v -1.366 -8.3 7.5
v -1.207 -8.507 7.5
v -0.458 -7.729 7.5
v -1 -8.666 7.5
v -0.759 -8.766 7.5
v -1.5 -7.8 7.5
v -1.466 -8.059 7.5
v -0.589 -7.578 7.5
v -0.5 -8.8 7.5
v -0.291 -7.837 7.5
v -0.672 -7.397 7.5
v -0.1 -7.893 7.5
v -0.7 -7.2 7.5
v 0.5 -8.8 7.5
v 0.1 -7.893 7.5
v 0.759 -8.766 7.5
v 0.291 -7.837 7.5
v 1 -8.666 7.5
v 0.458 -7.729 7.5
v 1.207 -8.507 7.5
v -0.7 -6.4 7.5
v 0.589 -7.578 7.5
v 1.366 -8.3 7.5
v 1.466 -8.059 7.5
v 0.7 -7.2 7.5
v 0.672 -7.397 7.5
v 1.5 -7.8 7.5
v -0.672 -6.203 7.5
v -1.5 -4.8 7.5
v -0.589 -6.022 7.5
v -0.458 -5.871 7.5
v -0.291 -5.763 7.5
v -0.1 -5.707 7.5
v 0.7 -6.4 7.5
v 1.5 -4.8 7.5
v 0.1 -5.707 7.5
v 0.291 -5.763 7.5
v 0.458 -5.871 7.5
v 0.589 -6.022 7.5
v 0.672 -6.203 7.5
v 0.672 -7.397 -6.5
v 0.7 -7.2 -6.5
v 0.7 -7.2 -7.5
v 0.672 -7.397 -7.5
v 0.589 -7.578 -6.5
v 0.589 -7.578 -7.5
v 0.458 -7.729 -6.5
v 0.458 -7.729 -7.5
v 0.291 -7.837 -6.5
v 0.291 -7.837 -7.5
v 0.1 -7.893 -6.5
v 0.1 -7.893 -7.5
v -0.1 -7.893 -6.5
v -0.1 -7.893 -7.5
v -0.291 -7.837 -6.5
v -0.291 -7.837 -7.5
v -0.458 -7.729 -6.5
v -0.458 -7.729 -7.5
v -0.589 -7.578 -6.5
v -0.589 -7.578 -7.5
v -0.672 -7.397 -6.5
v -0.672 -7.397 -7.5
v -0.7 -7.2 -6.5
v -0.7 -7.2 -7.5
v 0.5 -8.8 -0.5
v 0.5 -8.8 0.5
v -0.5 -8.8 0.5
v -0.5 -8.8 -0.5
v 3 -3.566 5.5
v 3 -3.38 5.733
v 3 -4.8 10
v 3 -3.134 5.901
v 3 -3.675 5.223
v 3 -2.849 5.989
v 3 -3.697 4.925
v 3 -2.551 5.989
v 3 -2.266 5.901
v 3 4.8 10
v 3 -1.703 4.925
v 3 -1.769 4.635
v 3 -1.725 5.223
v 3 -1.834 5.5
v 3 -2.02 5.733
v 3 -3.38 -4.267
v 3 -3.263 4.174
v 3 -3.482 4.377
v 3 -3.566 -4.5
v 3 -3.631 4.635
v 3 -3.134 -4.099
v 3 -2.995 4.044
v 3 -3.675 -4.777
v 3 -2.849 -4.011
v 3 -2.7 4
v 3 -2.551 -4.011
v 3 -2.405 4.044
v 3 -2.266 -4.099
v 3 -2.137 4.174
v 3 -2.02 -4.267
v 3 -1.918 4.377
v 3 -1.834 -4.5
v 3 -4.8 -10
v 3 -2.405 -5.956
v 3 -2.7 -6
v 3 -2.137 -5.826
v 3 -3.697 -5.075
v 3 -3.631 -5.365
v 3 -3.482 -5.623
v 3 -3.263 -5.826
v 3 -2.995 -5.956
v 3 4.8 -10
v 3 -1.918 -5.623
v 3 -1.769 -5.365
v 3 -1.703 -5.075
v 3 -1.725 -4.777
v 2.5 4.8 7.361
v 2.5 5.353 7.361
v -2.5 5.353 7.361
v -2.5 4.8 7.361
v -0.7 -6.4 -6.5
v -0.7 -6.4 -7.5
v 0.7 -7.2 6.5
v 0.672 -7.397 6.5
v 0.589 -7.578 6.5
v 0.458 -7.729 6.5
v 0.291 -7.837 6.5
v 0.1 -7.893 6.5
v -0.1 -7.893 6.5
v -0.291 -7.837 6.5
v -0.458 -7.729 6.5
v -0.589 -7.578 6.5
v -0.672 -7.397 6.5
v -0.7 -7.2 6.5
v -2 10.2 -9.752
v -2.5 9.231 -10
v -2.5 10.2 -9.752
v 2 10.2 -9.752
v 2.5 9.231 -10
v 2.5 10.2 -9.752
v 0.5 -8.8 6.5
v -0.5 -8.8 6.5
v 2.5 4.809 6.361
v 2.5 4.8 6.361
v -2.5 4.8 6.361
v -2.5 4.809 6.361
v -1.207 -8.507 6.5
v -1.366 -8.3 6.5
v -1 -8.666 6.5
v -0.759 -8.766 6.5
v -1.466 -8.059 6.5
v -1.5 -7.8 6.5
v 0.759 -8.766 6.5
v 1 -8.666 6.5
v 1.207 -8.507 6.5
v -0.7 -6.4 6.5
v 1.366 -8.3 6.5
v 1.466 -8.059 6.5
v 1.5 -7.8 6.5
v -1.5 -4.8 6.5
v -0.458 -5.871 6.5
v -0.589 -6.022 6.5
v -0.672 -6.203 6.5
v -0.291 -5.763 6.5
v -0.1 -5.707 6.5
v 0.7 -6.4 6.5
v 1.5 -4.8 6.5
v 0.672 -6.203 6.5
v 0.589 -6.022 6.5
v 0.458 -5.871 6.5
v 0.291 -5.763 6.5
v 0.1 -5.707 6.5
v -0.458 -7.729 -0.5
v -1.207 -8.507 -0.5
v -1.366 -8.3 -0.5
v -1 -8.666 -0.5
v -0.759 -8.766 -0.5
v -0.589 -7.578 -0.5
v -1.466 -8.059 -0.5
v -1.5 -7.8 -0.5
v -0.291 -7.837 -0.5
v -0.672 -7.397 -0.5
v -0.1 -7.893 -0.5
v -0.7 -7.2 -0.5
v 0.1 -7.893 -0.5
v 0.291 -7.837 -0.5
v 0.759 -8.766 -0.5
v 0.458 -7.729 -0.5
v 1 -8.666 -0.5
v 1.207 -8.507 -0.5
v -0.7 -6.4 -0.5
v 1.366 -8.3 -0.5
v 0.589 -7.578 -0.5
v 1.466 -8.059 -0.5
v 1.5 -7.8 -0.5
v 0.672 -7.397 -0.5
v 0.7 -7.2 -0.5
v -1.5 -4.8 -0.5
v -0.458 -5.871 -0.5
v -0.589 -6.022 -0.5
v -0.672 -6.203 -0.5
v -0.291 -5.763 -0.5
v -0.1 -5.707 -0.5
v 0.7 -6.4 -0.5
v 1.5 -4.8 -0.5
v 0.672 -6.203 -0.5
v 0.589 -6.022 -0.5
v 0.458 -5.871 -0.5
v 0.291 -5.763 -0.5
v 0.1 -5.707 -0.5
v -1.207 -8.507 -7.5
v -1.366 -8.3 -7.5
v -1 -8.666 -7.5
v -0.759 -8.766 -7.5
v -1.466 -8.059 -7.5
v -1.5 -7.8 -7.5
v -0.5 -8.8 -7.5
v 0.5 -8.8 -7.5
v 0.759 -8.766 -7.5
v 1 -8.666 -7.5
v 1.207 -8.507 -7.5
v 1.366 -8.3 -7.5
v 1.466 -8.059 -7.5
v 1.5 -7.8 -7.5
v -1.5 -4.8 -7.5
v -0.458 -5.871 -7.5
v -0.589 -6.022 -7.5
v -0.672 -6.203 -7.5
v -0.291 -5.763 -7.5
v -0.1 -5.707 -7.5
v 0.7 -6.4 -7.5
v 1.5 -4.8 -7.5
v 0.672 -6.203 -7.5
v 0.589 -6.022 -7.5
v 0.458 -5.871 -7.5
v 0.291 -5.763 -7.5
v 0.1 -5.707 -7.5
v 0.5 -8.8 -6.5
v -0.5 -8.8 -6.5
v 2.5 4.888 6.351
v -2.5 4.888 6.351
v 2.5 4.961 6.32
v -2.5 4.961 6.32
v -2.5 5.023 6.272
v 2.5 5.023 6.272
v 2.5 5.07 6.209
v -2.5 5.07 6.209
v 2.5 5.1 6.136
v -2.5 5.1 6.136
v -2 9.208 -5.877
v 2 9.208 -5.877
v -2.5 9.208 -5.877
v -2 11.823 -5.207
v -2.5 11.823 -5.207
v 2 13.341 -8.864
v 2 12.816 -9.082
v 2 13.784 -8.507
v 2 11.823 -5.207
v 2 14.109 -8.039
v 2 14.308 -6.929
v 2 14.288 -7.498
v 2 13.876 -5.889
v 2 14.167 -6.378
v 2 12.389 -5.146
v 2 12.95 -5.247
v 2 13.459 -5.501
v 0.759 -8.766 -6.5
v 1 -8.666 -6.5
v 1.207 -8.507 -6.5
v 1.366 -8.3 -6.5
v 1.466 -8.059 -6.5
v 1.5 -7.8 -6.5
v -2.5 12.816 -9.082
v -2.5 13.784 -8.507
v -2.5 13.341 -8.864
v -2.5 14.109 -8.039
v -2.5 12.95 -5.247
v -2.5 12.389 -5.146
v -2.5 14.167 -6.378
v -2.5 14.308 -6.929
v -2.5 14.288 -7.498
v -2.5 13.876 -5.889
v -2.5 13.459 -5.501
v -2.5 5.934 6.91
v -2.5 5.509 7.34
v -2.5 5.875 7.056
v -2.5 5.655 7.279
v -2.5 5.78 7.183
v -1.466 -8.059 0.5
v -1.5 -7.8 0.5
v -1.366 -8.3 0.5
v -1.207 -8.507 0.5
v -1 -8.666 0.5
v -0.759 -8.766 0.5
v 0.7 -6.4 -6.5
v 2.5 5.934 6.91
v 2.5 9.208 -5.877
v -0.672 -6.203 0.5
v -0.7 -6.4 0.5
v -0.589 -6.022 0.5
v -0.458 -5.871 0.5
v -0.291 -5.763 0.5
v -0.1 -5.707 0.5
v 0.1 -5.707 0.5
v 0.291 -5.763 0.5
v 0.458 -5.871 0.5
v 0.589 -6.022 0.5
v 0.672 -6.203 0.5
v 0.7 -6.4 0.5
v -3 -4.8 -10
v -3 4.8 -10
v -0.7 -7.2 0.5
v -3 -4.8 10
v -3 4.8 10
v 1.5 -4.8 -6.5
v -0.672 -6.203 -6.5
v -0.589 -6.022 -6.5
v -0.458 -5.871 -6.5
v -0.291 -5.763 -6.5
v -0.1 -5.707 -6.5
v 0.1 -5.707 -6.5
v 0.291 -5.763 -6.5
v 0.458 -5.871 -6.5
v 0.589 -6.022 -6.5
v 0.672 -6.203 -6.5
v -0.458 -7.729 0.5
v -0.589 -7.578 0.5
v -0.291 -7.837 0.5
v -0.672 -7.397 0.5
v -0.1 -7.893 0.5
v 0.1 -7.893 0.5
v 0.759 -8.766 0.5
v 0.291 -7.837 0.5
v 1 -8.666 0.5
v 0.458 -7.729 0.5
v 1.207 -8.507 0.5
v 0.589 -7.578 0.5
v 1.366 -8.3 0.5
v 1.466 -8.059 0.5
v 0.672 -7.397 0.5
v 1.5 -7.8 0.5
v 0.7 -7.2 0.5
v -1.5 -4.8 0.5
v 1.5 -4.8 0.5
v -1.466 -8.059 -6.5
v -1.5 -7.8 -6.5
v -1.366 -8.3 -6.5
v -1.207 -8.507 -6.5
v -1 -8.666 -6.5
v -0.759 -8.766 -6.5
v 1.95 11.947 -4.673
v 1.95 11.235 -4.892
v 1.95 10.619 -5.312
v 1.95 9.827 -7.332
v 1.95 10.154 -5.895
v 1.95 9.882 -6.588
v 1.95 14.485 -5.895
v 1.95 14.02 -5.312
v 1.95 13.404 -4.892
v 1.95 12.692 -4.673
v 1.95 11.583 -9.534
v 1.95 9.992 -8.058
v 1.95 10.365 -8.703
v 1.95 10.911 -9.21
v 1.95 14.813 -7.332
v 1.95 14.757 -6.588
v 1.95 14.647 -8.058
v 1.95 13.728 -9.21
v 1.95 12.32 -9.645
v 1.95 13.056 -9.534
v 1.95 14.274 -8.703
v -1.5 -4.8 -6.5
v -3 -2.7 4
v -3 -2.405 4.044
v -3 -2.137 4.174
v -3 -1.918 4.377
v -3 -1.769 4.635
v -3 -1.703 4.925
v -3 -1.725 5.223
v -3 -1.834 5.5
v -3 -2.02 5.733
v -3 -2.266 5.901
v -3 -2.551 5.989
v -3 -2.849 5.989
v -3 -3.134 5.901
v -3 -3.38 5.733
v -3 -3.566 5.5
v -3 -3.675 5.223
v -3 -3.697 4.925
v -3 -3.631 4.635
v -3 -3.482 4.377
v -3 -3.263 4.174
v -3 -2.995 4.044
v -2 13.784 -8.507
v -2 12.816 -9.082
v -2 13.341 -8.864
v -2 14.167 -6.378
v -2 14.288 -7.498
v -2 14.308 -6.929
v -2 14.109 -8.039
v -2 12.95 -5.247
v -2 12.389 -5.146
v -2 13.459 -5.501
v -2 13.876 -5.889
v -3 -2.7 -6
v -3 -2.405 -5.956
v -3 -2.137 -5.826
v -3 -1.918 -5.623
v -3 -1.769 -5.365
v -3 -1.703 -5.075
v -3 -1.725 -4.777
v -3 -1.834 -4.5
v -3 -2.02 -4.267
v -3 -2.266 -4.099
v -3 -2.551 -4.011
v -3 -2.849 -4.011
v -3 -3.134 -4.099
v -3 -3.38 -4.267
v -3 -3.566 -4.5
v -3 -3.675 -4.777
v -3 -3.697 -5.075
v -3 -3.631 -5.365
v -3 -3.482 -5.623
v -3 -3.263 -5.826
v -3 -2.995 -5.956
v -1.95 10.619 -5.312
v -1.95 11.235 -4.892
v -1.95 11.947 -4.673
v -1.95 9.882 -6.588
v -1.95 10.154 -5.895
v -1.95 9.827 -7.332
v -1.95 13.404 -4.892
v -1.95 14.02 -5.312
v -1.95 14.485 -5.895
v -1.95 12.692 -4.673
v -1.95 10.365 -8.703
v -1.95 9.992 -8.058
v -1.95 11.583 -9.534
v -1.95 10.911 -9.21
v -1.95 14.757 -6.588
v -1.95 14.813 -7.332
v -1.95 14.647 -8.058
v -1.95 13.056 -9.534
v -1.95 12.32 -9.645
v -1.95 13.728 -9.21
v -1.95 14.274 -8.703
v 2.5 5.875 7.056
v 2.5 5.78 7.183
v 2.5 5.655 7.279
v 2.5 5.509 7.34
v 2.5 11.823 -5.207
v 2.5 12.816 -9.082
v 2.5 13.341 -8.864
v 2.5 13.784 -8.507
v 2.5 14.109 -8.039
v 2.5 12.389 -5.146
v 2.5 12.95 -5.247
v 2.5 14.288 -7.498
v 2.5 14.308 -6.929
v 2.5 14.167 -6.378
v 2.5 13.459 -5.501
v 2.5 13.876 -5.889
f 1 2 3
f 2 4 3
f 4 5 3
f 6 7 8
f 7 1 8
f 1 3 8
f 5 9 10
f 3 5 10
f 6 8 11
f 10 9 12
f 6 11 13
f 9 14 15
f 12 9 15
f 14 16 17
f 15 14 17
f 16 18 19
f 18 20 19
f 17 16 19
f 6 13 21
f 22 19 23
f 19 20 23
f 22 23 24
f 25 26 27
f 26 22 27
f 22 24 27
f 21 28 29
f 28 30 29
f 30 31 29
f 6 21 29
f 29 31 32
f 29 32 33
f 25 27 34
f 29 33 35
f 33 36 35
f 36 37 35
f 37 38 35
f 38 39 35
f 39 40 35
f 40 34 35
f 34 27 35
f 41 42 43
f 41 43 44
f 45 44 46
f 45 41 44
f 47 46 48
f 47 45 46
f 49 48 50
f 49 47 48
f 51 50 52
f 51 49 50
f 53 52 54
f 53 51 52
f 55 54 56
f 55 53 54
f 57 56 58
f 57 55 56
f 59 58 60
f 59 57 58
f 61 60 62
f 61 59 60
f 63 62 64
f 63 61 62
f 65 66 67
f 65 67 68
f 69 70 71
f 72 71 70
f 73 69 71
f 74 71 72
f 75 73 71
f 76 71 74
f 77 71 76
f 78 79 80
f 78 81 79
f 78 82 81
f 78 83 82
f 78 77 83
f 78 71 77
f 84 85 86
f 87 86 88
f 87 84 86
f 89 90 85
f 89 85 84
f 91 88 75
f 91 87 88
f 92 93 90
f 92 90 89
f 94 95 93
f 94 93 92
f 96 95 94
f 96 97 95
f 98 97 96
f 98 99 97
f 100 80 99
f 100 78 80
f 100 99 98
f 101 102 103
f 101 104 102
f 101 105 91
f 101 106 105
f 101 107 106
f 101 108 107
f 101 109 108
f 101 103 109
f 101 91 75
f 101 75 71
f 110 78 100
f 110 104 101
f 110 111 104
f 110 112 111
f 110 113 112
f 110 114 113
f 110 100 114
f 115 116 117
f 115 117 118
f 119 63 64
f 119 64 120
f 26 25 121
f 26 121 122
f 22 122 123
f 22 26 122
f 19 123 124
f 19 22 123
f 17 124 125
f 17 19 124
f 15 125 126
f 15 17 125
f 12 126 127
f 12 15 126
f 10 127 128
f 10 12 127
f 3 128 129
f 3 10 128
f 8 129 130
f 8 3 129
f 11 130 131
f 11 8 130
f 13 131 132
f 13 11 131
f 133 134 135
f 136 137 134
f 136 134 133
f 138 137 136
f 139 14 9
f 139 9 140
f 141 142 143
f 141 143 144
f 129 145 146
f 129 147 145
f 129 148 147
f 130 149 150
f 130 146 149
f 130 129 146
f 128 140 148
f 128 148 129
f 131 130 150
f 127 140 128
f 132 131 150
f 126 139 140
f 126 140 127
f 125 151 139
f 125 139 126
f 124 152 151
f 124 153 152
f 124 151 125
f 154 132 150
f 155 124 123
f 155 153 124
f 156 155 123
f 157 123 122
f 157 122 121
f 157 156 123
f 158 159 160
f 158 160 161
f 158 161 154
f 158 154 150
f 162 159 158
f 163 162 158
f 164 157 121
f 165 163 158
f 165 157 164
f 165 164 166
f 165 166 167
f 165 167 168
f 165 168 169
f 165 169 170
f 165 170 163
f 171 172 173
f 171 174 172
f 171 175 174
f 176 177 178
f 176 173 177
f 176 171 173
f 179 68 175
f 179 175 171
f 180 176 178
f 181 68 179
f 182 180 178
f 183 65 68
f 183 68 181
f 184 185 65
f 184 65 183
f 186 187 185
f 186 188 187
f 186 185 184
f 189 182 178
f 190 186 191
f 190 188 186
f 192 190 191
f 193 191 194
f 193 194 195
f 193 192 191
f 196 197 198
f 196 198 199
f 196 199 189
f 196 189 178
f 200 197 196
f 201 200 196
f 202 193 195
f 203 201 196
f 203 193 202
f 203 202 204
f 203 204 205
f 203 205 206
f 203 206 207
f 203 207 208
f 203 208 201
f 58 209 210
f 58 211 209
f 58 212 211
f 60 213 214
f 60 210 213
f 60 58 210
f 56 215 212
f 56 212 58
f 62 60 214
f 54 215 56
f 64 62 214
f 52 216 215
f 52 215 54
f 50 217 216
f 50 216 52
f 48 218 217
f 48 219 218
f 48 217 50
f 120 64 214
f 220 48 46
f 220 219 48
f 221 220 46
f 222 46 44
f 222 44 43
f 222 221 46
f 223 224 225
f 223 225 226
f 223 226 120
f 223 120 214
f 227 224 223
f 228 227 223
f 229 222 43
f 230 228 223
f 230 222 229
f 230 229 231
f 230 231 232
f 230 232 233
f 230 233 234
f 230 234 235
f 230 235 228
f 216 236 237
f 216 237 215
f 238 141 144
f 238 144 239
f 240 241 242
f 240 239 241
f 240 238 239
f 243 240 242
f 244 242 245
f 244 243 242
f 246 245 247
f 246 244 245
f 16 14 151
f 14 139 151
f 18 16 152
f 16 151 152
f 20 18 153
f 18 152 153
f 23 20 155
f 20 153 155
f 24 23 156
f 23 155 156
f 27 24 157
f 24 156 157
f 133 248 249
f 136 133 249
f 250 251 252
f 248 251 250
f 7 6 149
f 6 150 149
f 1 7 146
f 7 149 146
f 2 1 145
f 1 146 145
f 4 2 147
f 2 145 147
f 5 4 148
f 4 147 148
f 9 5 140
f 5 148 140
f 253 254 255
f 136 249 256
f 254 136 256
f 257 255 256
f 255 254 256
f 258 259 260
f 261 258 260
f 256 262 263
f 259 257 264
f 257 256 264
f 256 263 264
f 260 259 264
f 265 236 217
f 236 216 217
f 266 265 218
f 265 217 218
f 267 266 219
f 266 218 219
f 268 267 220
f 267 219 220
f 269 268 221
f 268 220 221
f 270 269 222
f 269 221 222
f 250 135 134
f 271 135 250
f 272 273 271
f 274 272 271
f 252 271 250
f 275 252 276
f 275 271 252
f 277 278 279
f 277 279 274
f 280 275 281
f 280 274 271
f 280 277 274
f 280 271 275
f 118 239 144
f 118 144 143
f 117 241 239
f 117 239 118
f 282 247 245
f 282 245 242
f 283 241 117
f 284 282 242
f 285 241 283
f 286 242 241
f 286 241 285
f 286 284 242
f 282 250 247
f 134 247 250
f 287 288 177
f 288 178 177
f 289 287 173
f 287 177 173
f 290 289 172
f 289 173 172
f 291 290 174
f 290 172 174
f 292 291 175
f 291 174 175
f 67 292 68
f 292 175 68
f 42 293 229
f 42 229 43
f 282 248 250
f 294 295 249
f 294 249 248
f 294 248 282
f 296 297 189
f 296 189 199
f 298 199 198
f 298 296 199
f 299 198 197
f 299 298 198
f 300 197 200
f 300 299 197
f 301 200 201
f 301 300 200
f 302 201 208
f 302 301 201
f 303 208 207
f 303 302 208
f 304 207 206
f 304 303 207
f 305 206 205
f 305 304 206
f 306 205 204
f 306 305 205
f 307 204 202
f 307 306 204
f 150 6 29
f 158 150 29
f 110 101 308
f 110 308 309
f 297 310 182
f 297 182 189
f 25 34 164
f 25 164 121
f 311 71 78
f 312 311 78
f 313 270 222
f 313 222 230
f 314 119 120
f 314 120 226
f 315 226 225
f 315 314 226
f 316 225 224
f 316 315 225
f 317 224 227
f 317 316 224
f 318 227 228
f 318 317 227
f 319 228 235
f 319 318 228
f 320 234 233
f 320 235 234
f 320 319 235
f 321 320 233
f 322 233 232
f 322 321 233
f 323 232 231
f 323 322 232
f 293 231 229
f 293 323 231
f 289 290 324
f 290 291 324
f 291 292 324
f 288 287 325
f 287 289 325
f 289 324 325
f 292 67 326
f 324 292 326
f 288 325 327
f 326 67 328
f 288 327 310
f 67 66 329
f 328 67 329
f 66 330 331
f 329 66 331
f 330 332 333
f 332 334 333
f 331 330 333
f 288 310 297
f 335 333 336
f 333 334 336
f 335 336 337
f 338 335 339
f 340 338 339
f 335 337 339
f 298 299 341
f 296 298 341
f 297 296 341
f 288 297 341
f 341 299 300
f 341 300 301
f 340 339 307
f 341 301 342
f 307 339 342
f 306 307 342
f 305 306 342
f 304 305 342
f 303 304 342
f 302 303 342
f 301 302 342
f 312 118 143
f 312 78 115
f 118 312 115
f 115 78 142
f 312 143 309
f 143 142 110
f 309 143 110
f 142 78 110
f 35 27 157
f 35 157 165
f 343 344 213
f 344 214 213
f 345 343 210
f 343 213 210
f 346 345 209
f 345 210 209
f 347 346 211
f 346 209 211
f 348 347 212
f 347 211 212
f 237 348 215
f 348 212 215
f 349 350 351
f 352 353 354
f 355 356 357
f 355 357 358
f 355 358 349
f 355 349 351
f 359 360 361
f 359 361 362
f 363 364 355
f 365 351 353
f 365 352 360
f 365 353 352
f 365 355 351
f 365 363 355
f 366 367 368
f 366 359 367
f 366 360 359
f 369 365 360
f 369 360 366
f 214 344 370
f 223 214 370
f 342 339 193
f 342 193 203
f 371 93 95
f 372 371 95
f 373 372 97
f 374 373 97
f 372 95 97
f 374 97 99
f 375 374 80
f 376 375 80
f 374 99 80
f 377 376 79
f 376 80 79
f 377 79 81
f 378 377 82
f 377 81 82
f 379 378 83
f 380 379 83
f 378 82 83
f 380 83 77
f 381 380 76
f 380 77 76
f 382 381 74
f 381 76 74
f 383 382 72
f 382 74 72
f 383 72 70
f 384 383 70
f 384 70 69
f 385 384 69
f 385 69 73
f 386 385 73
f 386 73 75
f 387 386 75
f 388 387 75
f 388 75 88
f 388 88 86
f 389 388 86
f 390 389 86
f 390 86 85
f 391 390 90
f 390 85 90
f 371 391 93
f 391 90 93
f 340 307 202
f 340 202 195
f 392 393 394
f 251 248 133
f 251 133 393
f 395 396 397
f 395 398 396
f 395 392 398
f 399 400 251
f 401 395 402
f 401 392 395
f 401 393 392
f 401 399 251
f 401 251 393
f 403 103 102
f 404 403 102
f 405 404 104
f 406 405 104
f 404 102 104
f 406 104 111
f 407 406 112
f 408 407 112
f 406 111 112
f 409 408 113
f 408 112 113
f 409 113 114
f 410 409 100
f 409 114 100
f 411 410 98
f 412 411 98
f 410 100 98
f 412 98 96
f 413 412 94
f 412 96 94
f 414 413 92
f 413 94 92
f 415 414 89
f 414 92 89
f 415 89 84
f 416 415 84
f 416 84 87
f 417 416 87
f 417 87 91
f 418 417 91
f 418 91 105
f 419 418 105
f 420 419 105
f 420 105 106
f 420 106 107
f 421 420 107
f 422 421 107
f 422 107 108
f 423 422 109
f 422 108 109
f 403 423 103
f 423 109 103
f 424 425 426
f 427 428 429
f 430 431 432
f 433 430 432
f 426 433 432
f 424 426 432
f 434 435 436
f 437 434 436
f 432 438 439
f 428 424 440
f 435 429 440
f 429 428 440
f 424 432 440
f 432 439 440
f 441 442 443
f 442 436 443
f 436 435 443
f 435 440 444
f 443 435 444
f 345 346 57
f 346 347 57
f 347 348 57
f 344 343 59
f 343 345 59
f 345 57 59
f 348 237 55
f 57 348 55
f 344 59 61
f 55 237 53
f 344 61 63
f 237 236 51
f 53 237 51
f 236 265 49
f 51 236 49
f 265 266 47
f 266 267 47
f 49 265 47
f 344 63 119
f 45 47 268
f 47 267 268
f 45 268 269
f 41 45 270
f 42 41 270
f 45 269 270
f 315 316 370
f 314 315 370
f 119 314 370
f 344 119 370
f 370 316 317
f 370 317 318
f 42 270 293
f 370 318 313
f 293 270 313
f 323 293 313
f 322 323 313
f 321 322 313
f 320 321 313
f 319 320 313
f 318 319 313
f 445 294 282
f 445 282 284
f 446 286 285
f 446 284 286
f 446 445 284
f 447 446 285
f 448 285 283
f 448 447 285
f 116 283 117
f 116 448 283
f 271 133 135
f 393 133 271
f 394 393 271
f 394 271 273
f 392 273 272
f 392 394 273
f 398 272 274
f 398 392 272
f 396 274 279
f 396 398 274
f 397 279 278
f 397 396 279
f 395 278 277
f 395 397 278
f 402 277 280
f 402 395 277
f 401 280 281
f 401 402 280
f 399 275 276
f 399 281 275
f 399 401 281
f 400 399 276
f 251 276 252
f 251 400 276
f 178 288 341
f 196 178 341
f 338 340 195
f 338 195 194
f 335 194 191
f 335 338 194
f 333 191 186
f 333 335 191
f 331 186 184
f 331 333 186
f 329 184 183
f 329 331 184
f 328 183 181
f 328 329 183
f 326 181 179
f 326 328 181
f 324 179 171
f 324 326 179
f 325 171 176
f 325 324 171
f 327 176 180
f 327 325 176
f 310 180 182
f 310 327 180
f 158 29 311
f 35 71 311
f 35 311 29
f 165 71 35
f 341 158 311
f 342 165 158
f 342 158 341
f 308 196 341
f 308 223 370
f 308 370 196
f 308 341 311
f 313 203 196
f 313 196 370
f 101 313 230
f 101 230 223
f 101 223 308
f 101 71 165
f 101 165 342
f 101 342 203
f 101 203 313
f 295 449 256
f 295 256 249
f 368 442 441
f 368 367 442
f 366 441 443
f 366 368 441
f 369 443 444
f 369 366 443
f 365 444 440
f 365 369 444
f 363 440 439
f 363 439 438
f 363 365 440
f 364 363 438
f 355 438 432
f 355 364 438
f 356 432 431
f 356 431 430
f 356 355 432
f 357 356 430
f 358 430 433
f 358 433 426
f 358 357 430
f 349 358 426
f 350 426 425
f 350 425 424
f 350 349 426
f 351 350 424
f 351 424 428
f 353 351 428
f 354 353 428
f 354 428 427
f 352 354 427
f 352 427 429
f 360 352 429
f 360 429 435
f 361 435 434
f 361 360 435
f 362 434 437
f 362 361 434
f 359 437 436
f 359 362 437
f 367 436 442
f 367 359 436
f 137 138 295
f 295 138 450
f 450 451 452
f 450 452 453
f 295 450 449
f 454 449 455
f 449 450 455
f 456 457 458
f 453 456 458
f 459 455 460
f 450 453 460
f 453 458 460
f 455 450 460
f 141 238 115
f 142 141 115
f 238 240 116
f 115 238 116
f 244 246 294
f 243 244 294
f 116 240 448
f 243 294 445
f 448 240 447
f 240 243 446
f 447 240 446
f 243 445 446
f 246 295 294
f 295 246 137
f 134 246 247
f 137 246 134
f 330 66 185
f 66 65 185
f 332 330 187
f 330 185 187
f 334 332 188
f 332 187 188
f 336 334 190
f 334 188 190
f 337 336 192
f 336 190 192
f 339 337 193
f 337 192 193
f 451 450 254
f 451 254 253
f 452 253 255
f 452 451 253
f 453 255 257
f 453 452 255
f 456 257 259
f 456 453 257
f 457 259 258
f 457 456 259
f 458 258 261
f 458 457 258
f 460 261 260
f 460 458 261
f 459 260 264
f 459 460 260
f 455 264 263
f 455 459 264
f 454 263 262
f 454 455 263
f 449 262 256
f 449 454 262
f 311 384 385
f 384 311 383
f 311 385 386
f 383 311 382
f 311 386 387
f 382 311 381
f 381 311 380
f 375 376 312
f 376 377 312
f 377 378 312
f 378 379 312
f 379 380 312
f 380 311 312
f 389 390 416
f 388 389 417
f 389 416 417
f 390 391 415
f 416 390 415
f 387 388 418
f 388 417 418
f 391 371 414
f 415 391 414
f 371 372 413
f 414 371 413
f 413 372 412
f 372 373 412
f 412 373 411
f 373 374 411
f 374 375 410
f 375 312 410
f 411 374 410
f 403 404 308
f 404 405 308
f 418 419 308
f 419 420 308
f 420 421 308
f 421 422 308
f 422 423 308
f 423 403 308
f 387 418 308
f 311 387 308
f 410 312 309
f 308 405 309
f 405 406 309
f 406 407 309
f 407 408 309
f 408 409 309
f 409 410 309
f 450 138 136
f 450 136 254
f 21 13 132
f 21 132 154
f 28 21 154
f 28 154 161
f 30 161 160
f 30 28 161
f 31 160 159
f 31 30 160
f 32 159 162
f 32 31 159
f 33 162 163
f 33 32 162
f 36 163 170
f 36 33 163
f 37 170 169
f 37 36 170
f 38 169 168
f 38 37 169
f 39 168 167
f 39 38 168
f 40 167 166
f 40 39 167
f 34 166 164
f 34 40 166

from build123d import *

# Parameters (mm, degrees)
SKETCH1_W           = 20
SKETCH1_H           = 9.6
SKETCH1_W_2         = 1
SKETCH1_H_2         = 4
BOSS_EXTRUDE1_DEPTH = 3
SKETCH2_R           = 1
CUT_EXTRUDE1_DEPTH  = 6
SKETCH4_W           = 1.5
SKETCH4_H           = 4
CUT_EXTRUDE2_DEPTH  = 18.5
CUT_EXTRUDE3_DEPTH  = 0.5
SKETCH6_W           = 4
SKETCH6_H           = 4.7
CUT_EXTRUDE4_DEPTH  = 6.262080904
SKETCH7_R           = 2.5
BOSS_EXTRUDE2_DEPTH = 1.95
FILLET1_R           = 1


with BuildPart() as part:
    # Sketch1 → Boss-Extrude1 (new body, symmetric)
    with BuildSketch(Plane(origin=(0, 0, 0), x_dir=(0, 0, -1), z_dir=(1, 0, 0))):
        Rectangle(SKETCH1_W, SKETCH1_H)
        with BuildLine():
            Line((5.207264869, 11.823485535), (5.876960726, 9.20785799))
            Line((5.876960726, 9.20785799), (9.751964497, 10.2))
            Line((9.751964497, 10.2), (9.08226864, 12.815627546))
            ThreePointArc((9.08226864, 12.815627546), (6.648695749, 14.257058427), (5.207264869, 11.823485535))
        make_face()
        with BuildLine():
            Line((5.876960726, 9.20785799), (-6.909917136, 5.933951832))
            ThreePointArc((-6.909917136, 5.933951832), (-7.2350646, 5.720605614), (-7.361095835, 5.352701266))
            Line((-7.361095835, 5.352701266), (-7.361095835, 4.8))
            Line((-7.361095835, 4.8), (-6.361095835, 4.8))
            Line((-6.361095835, 4.8), (-6.361095835, 4.809346803))
            ThreePointArc((-6.361095835, 4.809346803), (-6.298080217, 4.993298978), (-6.135506485, 5.099972086))
            Line((-6.135506485, 5.099972086), (10, 9.231249057))
            Line((10, 9.231249057), (9.751964497, 10.2))
            Line((9.751964497, 10.2), (5.876960726, 9.20785799))
        make_face()
        with BuildLine():
            Line((5.207264869, 11.823485535), (5.876960726, 9.20785799))
            Line((5.876960726, 9.20785799), (9.751964497, 10.2))
            Line((9.751964497, 10.2), (9.08226864, 12.815627546))
            ThreePointArc((9.08226864, 12.815627546), (6.648695749, 14.257058427), (5.207264869, 11.823485535))
        make_face()
        with Locations((-7, -6.8)):
            Rectangle(SKETCH1_W_2, SKETCH1_H_2)
        with Locations((0, -6.8)):
            Rectangle(SKETCH1_W_2, SKETCH1_H_2)
        with Locations((7, -6.8)):
            Rectangle(SKETCH1_W_2, SKETCH1_H_2)
    extrude(amount=BOSS_EXTRUDE1_DEPTH, both=True)

    # Sketch2 → Cut-Extrude1 (cut)
    with BuildSketch(Plane(origin=(3, 0, 0), x_dir=(0, 0, -1), z_dir=(1, 0, 0))):
        with Locations((-5, -2.7)):
            Circle(SKETCH2_R)
        with Locations((5, -2.7)):
            Circle(SKETCH2_R)
    extrude(amount=-CUT_EXTRUDE1_DEPTH, mode=Mode.SUBTRACT)

    # Sketch4 → Cut-Extrude2 (cut, through all)
    with BuildSketch(Plane.XY.offset(7.5)):
        with Locations((2.25, -6.8)):
            Rectangle(SKETCH4_W, SKETCH4_H)
        with Locations((-2.25, -6.8)):
            Rectangle(SKETCH4_W, SKETCH4_H)
        with BuildLine():
            Line((-0.7, -7.2), (-0.7, -6.4))
            ThreePointArc((-0.7, -6.4), (0, -5.7), (0.7, -6.4))
            Line((0.7, -6.4), (0.7, -7.2))
            ThreePointArc((0.7, -7.2), (0, -7.9), (-0.7, -7.2))
        make_face()
    extrude(amount=-CUT_EXTRUDE2_DEPTH, mode=Mode.SUBTRACT)

    # Sketch5 → Cut-Extrude3 (cut)
    with BuildSketch(Plane(origin=(3, 0, 0), x_dir=(0, 0, -1), z_dir=(1, 0, 0))):
        with BuildLine():
            Line((-6.361095835, 4.8), (-7.361095835, 4.8))
            Line((-7.361095835, 4.8), (-7.361095835, 5.352701266))
            ThreePointArc((-7.361095835, 5.352701266), (-7.2350646, 5.720605614), (-6.909917136, 5.933951832))
            Line((-6.909917136, 5.933951832), (5.876960726, 9.20785799))
            Line((5.876960726, 9.20785799), (5.207264869, 11.823485535))
            ThreePointArc((5.207264869, 11.823485535), (6.648695749, 14.257058427), (9.08226864, 12.815627546))
            Line((9.08226864, 12.815627546), (10, 9.231249057))
            Line((10, 9.231249057), (-6.135506485, 5.099972086))
            ThreePointArc((-6.135506485, 5.099972086), (-6.298080217, 4.993298978), (-6.361095835, 4.809346803))
            Line((-6.361095835, 4.809346803), (-6.361095835, 4.8))
        make_face()
    cut_extrude3 = extrude(amount=-CUT_EXTRUDE3_DEPTH, mode=Mode.SUBTRACT)

    # Mirror1: Cut-Extrude3 across plane
    add(cut_extrude3.mirror(Plane(origin=(0, 0, 0), x_dir=(0, 0, 1), z_dir=(1, 0, 0))), mode=Mode.SUBTRACT)

    # Sketch6 → Cut-Extrude4 (cut, through all)
    with BuildSketch(Plane(origin=(0, 1.978625569, -7.727907359), x_dir=(1, 0, 0), z_dir=(0, -0.248035503, 0.968750943))):
        with Locations((0, 9.812426202)):
            Rectangle(SKETCH6_W, SKETCH6_H)
    extrude(amount=-CUT_EXTRUDE4_DEPTH, mode=Mode.SUBTRACT)

    # Fillet1
    fillet1_edges = [part.edges().sort_by_distance(p)[0] for p in [
        (1.5, -8.8, -7),
        (1.5, -8.8, 0),
        (1.5, -8.8, 7),
        (-1.5, -8.8, -7),
        (-1.5, -8.8, 0),
        (-1.5, -8.8, 7),
    ]]
    fillet(fillet1_edges, radius=FILLET1_R)


with BuildPart() as body_2:
    # Sketch7 → Boss-Extrude2 (new body, symmetric)
    with BuildSketch(Plane(origin=(0, 0, 0), x_dir=(0, 0, -1), z_dir=(1, 0, 0))):
        with Locations((7.144766754, 12.319556541)):
            Circle(SKETCH7_R)
    extrude(amount=BOSS_EXTRUDE2_DEPTH, both=True)


solid = Compound([part.part, body_2.part])
